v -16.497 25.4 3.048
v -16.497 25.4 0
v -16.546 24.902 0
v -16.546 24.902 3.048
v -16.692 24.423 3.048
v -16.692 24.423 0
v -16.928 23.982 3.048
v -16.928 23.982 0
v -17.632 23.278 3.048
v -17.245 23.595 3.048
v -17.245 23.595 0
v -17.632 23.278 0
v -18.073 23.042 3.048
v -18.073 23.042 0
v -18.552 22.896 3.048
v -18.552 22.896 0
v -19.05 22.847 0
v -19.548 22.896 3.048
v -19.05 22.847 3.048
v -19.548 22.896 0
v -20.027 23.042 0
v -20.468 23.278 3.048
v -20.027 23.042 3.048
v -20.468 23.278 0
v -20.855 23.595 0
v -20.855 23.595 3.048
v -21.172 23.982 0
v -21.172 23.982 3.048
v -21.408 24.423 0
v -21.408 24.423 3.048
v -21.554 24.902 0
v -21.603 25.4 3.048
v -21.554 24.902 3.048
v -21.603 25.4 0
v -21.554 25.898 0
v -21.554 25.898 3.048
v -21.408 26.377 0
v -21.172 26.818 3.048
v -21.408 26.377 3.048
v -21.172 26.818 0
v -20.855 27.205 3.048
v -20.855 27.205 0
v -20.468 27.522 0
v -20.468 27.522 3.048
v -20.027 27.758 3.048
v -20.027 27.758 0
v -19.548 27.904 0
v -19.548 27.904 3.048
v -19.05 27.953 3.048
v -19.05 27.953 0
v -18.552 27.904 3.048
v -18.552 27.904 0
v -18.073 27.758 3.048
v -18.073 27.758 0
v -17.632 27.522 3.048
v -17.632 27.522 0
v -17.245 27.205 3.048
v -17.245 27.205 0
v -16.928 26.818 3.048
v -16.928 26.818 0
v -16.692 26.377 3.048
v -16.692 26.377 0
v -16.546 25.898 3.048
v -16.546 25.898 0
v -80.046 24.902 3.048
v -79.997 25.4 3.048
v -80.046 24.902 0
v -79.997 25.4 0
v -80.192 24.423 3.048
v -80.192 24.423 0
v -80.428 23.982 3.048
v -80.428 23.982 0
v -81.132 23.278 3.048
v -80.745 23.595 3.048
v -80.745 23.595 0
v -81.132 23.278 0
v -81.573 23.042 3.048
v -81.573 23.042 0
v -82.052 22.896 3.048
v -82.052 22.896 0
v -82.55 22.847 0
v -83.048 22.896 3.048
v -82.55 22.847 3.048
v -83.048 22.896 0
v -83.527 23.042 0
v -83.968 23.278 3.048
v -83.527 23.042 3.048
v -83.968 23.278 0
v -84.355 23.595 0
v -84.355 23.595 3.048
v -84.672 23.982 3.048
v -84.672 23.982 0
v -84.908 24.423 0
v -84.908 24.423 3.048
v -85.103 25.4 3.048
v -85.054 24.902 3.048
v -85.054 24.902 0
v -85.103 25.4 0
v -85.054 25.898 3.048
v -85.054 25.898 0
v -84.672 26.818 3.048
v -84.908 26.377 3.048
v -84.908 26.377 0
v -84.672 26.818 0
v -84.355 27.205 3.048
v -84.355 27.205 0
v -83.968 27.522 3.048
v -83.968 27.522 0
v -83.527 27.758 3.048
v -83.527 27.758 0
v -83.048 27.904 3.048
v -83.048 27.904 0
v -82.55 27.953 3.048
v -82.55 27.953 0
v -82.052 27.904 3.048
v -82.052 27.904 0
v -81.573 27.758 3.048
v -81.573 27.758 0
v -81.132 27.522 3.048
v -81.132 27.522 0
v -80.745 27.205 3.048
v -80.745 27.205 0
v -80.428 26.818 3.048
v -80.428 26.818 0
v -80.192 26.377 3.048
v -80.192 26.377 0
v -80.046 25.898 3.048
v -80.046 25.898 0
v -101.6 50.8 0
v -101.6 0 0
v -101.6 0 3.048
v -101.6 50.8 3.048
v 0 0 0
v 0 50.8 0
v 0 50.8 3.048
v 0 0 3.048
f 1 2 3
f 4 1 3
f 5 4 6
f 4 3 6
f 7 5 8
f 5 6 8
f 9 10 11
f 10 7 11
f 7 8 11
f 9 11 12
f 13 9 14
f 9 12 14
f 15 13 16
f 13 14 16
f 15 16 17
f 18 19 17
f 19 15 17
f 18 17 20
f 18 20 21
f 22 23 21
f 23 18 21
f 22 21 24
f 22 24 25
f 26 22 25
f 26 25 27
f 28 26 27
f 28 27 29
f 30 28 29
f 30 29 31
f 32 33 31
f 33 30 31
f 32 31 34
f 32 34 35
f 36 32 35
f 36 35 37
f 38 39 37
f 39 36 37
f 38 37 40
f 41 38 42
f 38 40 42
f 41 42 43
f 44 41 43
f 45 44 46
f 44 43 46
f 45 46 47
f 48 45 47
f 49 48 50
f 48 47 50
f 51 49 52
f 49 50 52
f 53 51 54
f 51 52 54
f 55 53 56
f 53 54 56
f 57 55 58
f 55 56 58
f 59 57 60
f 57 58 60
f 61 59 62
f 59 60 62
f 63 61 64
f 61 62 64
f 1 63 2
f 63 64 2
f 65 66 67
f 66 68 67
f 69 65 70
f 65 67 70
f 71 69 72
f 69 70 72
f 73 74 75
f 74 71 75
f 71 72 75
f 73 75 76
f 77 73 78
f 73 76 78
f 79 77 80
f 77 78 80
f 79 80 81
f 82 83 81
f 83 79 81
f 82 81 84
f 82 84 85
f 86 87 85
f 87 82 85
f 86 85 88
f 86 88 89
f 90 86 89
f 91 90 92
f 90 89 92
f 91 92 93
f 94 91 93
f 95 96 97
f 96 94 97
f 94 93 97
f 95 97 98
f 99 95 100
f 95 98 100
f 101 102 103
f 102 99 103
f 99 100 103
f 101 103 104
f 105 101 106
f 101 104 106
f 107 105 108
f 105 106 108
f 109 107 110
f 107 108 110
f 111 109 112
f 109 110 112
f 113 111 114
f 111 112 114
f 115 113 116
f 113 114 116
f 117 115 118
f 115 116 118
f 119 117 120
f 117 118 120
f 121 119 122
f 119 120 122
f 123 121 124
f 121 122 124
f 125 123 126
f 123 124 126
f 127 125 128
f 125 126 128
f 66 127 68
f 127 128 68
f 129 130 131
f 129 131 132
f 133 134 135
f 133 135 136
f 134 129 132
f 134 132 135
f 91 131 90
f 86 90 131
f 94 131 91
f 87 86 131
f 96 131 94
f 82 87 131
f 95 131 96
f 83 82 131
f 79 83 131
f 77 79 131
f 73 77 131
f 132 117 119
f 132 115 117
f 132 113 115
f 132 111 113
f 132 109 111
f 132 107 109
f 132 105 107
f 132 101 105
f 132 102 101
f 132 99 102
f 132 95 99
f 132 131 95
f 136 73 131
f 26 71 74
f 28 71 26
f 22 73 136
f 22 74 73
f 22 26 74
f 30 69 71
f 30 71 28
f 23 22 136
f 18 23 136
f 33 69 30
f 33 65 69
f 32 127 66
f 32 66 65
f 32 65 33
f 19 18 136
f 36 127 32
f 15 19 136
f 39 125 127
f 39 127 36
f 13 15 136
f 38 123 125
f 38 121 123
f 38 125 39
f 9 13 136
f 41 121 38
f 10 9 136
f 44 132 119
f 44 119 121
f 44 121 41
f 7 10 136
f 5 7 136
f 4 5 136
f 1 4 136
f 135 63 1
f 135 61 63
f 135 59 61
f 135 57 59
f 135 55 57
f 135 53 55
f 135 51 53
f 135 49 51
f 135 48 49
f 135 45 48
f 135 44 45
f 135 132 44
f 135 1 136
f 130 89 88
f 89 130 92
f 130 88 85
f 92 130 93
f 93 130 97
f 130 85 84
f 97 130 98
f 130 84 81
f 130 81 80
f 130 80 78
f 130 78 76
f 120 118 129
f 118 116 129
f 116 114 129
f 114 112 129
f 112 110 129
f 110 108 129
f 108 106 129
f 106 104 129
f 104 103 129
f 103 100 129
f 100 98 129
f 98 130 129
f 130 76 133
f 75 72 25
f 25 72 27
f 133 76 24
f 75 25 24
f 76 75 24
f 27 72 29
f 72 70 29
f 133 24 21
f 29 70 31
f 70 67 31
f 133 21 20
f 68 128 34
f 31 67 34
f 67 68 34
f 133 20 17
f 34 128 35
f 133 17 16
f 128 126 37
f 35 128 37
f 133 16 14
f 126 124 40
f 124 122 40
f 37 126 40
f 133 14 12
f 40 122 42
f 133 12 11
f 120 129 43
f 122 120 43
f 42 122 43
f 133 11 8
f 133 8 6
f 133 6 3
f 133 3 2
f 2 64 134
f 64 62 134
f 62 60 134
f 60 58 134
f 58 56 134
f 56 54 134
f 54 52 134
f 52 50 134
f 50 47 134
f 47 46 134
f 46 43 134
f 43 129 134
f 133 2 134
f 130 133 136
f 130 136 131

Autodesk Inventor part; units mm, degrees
ref_plane "YZ Plane" through (0, 0, 0) normal (1, 0, 0) x (0, 1, 0)
ref_plane "XZ Plane" through (0, 0, 0) normal (0, 1, 0) x (-1, 0, 0)
ref_plane "XY Plane" through (0, 0, 0) normal (0, 0, 1) x (1, 0, 0)
sketch "Sketch1" plane through (0, 0, 0) normal (0, 0, 1) x (1, 0, 0)
  line L0 (0, 0) -> (-101.6, 0)
  line L1 (-101.6, 0) -> (-101.6, 50.8)
  line L2 (-101.6, 50.8) -> (0, 50.8)
  line L3 (0, 50.8) -> (0, 0)
  circle A0 centre (-82.55, 25.4) radius 2.5527
  circle A1 centre (-19.05, 25.4) radius 2.5527
  dimension "holewidth" = 5.1054
  dimension "d1" = 5.1054
  dimension "d2" = 50.8
  dimension "d3" = 101.6
  dimension "d6" = 63.5
  dimension "d7" = 19.05
  dimension "d8" = 25.4
  dimension "d9" = 19.05
extrude "Plate1" add sketch "Sketch1" along normal blind 3.048
equation "\"d1\" = holewidth"
equation "\"BendRadius\" = Thickness"
equation "\"BendReliefWidth\" = Thickness"
equation "\"BendReliefDepth\" = 0.5 * Thickness"
equation "\"CornerReliefSize\" = 4 * Thickness"
equation "\"MinimumRemnant\" = 2 * Thickness"
equation "\"TransitionRadius\" = BendRadius"
equation "\"JacobiRadiusSize\" = BendRadius"
equation "\"GapSize\" = Thickness"
equation "\"d10\" = BendRadius"
equation "\"Thickness\" = 3.048"
properties part number "Nano Mounting Plate"
